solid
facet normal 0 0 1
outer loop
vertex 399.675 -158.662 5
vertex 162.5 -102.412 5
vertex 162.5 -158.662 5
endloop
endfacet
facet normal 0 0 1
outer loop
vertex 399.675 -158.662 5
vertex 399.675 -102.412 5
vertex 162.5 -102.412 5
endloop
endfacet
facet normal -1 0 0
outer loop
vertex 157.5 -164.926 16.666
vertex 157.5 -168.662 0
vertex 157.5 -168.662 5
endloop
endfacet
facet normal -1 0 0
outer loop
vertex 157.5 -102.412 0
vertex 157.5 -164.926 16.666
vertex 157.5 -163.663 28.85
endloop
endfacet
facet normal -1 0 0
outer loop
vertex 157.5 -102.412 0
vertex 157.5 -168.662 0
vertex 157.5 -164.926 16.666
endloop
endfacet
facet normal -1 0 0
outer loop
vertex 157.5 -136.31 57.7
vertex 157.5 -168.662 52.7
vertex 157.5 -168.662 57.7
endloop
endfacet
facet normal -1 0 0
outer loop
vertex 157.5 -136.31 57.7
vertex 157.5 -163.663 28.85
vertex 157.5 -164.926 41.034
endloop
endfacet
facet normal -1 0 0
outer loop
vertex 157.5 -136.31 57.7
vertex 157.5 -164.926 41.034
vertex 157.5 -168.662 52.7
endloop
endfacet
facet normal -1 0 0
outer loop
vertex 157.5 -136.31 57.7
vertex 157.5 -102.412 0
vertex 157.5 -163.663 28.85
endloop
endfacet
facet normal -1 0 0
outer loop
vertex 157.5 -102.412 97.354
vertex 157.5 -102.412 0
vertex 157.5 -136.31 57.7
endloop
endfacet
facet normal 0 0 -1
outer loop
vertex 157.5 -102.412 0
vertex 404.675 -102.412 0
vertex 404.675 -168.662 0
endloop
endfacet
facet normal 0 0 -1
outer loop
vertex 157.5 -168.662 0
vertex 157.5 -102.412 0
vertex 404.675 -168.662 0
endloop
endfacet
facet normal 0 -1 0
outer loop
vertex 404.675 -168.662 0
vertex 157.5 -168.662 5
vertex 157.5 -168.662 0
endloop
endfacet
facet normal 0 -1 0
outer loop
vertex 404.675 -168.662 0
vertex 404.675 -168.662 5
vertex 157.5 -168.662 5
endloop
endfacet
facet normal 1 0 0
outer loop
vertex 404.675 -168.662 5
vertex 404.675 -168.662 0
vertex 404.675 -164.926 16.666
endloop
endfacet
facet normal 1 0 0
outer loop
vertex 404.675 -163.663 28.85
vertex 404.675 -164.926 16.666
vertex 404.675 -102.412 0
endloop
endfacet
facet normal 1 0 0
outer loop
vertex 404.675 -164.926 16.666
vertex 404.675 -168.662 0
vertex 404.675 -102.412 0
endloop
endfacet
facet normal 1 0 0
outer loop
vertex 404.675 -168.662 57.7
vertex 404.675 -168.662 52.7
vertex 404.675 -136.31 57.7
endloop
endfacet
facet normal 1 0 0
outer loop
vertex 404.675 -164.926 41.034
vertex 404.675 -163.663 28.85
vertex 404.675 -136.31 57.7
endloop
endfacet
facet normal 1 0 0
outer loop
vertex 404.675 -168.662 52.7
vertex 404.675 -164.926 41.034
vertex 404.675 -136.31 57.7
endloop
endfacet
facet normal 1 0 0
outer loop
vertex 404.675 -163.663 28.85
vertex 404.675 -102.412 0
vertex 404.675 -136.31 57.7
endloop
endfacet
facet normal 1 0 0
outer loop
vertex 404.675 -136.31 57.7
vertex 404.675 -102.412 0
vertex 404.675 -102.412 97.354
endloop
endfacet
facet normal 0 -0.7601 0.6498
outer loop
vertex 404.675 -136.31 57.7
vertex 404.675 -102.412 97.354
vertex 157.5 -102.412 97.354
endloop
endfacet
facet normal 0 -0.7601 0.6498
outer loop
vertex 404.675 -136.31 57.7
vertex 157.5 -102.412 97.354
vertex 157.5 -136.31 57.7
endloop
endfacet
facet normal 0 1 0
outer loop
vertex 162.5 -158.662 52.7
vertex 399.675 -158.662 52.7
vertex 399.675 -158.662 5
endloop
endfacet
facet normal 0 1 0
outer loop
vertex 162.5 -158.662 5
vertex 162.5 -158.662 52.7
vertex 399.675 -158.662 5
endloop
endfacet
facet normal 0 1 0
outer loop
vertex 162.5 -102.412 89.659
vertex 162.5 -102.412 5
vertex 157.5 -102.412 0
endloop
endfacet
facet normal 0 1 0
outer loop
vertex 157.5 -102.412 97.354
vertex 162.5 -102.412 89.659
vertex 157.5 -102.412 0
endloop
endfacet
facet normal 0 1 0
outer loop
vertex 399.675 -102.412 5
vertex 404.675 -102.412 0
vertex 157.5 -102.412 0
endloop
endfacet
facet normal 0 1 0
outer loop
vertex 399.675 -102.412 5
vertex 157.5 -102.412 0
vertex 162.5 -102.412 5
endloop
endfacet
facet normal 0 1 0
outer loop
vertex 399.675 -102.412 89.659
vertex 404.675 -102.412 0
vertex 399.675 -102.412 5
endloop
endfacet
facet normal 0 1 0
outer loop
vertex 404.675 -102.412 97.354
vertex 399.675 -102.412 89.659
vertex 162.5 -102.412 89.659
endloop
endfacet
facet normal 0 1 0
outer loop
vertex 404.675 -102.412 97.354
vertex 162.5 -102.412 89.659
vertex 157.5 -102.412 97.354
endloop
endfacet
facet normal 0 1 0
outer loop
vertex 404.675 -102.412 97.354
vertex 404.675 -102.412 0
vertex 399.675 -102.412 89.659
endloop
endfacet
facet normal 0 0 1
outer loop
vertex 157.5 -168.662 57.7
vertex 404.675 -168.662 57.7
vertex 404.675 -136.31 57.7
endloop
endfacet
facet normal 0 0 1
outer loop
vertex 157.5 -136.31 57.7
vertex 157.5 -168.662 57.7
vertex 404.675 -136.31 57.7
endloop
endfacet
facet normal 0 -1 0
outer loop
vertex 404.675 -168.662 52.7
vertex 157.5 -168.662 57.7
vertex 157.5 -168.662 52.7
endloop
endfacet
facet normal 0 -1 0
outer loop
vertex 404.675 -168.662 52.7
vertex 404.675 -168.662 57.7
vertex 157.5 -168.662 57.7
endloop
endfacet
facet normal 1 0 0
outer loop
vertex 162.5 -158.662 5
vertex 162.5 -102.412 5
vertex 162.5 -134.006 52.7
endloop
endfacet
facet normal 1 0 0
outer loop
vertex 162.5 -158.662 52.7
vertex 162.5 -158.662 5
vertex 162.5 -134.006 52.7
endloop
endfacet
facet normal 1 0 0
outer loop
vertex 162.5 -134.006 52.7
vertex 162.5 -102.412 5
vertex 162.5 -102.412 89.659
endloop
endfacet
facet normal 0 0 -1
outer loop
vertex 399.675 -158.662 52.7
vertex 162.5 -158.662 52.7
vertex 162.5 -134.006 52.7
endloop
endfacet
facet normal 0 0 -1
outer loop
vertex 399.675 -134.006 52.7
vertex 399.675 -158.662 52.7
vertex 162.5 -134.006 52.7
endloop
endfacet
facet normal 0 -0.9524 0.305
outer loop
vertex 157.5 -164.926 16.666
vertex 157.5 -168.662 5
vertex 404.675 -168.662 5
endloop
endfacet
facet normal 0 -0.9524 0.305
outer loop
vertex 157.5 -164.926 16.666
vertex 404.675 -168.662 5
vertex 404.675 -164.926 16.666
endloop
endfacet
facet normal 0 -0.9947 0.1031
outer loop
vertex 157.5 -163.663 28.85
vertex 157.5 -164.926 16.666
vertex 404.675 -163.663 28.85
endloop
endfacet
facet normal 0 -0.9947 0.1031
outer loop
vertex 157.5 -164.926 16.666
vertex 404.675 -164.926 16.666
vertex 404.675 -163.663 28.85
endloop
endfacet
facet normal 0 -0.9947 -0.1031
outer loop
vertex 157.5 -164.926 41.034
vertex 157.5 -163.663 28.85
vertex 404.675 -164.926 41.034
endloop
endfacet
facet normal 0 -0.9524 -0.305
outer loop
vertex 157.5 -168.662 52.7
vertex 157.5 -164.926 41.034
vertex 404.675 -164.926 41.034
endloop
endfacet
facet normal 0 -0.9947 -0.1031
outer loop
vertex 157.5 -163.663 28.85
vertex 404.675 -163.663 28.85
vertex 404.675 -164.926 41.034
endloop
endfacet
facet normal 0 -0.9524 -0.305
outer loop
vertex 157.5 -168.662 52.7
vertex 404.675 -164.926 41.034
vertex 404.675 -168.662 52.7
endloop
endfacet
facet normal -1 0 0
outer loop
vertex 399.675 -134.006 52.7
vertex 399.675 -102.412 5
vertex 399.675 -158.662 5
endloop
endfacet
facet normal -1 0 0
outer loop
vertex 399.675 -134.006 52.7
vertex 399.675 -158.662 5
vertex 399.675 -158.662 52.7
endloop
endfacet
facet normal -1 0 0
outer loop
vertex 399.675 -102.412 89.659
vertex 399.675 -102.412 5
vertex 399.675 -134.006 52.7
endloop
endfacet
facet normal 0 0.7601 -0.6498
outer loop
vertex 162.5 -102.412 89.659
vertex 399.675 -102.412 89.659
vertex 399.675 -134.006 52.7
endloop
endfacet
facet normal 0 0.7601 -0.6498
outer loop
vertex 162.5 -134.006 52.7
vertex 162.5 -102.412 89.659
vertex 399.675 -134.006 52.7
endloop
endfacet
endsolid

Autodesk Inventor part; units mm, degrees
ref_plane "YZ Plane" through (0, 0, 0) normal (1, 0, 0) x (0, 1, 0)
ref_plane "XZ Plane" through (0, 0, 0) normal (0, 1, 0) x (-1, 0, 0)
ref_plane "XY Plane" through (0, 0, 0) normal (0, 0, 1) x (1, 0, 0)
ref_plane "Work Plane1" through (0, 0, 0) normal (0, 0, 1) x (1, 0, 0)
ref_plane "Work Plane2" through (157.5, -135.5375, 119.9) normal (1, 0, 0) x (0, 0, -1)
ref_plane "Work Plane3" through (404.675, -135.5375, 119.9) normal (-1, 0, 0) x (0, 0, 1)
sketch "Sketch2" plane through (404.675, -135.5375, 119.9) normal (-1, 0, 0) x (0, 0, 1)
  line L0 (-120, -33.125) -> (-120, 33.125) projected
  line L1 (120, -33.125) -> (-120, -33.125) projected
  line L2 (120, 33.125) -> (120, -33.125) projected
  line L3 (-120, 33.125) -> (120, 33.125) projected
  circle A0 centre (7, 26.125) radius 1.95 projected
  circle A1 centre (113, -26.875) radius 1.95 projected
  circle A2 centre (113, 12.125) radius 1.95 projected
  circle A3 centre (99, 26.125) radius 1.95 projected
  circle A4 centre (-55, -26.875) radius 1.95 projected
  line L4 (0.75, 33.125) -> (-62, -20.125) projected
  line L5 (-50.0649, 0.1287) -> (-21.3323, 24.6904) projected
  line L6 (-11.7313, 32.1577) -> (-59.0108, -8.2587) projected
  line L7 (-62, -22.3139) -> (-62, -29.97) projected
  line L8 (-119.9, -33.125) -> (-62.2, -33.125)
  line L9 (-62.2, -33.125) -> (-62.2, 33.125)
  line L10 (-62.2, 33.125) -> (-119.9, 33.125)
  line L11 (-119.9, 33.125) -> (-119.9, -33.125)
  line L12 (-62.2, 33.125) -> (-22.5461, 33.125)
  line L13 (-22.5461, 33.125) -> (-62.2, -0.7727)
  line L14 (-50.1997, 8.8278) -> (-29.9045, 26.1769) projected
  point P0 (-119.9, 135.5375)
  point P1 (-119.9, 33.125)
  point P2 (-119.9, -33.125)
  point P3 (-62.2, -33.125)
  dimension "d2" = 0.1
  dimension "d3" = 0.2
  dimension "d16" = 0.5
extrude "Extrusion1" add sketch "Sketch2" along normal up to surface (247.175 mm away) contours L11 L3 L9 L1 | L3 L13 L9
shell "Shell1" thickness 5 removed faces 1 at (322.2833, -102.4125, 64.9026)
sketch "Sketch3" plane through (404.675, -135.5375, 119.9) normal (1, 0, 0) x (0, 0, -1)
  line L0 (114.9, -28.125) -> (67.2, -28.125) projected
  line L1 (67.2, -28.125) -> (67.2, 1.531) projected
  line L2 (115, 28.125) -> (115, -28.125) projected
  line L3 (67.2, -23.125) -> (115, -23.125)
  line L4 (115, -23.125) -> (115, -28.125)
  line L5 (115, -28.125) -> (67.2, -28.125)
  line L6 (67.2, -28.125) -> (67.2, -23.125)
  point P0 (119.9, 135.5375)
  point P1 (115, -23.125)
  dimension "d8" = 5
extrude "Extrusion2" add sketch "Sketch3" against normal up to surface (242.175 mm away)
sketch "Sketch4" plane through (404.675, -135.5375, 119.9) normal (1, 0, 0) x (0, 0, -1)
  line L0 (119.9, -33.125) -> (62.2, -33.125) projected
  arc A0 (114.9, -33.125) -> (67.2, -33.125) centre (91.05, -87.5073) ccw
  point P0 (119.9, 135.5375)
  point P1 (91.05, -28.125)
  point P2 (91.05, -33.125)
  dimension "d12" = 5
  dimension "d13" = 5
extrude "Extrusion3" cut sketch "Sketch4" against normal through all
properties part number "sump"
